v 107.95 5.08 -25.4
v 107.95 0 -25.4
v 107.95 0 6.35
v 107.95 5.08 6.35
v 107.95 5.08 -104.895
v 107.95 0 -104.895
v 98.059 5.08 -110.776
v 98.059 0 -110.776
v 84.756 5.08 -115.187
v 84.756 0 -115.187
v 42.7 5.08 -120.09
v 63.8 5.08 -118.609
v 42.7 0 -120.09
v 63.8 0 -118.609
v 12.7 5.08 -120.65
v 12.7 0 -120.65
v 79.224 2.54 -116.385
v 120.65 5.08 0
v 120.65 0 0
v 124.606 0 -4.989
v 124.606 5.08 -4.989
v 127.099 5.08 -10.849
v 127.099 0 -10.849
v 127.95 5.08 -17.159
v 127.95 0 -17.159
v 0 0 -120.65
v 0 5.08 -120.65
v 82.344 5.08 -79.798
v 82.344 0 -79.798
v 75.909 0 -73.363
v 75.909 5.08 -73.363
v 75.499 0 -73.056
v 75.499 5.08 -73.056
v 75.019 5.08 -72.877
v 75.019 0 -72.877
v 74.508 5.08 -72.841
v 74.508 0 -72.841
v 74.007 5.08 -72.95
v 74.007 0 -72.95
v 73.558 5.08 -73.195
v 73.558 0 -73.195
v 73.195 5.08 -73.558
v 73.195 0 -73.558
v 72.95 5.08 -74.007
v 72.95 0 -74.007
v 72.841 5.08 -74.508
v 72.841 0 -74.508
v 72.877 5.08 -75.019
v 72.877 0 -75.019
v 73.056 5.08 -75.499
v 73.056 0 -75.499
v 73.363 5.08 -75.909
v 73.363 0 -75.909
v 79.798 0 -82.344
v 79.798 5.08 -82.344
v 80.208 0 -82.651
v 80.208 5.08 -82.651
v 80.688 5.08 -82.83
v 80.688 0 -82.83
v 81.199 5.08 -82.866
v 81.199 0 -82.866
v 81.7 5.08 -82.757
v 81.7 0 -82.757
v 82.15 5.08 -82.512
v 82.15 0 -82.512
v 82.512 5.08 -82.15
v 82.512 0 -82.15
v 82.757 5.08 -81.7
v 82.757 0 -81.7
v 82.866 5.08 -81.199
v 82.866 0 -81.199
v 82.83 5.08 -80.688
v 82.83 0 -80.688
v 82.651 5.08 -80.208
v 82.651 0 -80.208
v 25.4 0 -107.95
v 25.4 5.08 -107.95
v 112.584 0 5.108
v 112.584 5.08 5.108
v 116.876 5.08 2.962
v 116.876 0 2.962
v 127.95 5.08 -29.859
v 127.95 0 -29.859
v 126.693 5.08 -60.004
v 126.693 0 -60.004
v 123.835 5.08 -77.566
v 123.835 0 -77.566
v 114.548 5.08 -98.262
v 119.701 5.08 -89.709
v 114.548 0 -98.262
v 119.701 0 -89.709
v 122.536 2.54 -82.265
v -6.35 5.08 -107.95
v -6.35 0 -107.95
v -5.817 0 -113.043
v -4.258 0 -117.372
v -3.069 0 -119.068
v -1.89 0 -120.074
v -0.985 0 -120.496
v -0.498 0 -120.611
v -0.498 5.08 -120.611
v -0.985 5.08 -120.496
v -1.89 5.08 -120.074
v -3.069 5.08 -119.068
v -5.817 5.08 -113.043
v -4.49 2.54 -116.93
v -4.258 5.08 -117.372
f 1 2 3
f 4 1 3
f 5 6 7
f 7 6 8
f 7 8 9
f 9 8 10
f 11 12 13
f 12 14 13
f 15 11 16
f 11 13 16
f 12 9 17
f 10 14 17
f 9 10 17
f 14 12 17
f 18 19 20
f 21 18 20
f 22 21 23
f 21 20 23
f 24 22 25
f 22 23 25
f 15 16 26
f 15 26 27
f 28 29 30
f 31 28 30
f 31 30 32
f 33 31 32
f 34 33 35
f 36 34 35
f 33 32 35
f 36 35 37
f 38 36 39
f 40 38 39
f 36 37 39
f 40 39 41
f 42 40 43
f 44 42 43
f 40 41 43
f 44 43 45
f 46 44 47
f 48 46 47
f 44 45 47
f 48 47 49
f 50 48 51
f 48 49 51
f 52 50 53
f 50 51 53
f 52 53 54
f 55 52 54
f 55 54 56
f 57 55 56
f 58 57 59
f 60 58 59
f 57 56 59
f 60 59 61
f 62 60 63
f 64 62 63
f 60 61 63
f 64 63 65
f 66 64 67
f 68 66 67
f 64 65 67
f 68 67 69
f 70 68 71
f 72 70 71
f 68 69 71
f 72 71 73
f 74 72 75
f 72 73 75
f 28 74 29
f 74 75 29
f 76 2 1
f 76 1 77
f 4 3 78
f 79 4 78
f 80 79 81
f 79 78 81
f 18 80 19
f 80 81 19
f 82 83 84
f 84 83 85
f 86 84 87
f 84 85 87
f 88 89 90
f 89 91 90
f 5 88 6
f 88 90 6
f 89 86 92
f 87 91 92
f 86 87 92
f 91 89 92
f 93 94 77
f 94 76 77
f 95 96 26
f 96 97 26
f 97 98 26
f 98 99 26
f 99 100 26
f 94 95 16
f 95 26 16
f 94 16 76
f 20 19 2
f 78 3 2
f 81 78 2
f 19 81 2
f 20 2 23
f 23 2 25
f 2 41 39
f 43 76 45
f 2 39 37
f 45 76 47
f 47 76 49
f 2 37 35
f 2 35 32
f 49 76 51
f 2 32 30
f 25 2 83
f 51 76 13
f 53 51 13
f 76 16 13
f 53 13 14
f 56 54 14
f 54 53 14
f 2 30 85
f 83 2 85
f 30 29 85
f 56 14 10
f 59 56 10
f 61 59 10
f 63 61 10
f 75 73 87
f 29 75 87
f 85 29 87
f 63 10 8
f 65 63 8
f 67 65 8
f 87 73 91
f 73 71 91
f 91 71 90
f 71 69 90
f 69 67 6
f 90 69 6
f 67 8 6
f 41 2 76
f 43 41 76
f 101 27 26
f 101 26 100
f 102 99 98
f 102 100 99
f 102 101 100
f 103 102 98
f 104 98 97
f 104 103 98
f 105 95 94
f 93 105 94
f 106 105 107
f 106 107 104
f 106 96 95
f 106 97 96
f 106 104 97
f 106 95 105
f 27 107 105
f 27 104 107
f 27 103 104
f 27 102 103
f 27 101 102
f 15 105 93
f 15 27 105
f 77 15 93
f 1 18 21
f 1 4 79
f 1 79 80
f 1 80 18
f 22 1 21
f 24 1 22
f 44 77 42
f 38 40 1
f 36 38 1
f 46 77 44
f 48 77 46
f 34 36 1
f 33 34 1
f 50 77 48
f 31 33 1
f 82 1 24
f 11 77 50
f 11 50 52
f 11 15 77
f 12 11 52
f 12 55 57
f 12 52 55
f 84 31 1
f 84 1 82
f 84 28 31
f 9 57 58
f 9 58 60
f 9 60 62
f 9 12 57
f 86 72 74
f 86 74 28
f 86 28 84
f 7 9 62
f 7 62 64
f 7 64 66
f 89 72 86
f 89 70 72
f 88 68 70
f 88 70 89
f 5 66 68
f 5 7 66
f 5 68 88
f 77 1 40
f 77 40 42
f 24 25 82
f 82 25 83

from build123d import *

# Parameters (mm, degrees)
BOSS_EXTRUDE1_DEPTH = 5.08
SKETCH2_W           = 12.7
SKETCH2_H           = 5.08
BOSS_EXTRUDE2_DEPTH = 6.35
FILLET3_SIZE        = 6.35
FILLET3_SIZE_2      = 12.7
BOSS_EXTRUDE3_START = -5.08
BOSS_EXTRUDE3_DEPTH = 5.08


with BuildPart() as part:
    # Sketch1 → Boss-Extrude1 (new body)
    with BuildSketch(Plane(origin=(0, 0, 0), x_dir=(1, 0, 0), z_dir=(0, 1, 0))):
        with BuildLine():
            Line((0, 120.65), (12.7, 120.65))
            ThreePointArc((12.7, 120.65), (89.032177029, 89.032177029), (120.65, 12.7))
            Line((120.65, 12.7), (120.65, 0))
            Line((120.65, 0), (107.95, 0))
            Line((107.95, 0), (107.95, 25.4))
            Line((107.95, 25.4), (25.4, 107.95))
            Line((25.4, 107.95), (0, 107.95))
            Line((0, 107.95), (0, 120.65))
        make_face()
        with BuildLine():
            Line((73.363460454, 75.909044866), (79.798132163, 82.343716575))
            ThreePointArc((79.798132163, 82.343716575), (82.343716575, 82.343716575), (82.343716575, 79.798132163))
            Line((82.343716575, 79.798132163), (75.909044866, 73.363460454))
            ThreePointArc((75.909044866, 73.363460454), (73.363460454, 73.363460454), (73.363460454, 75.909044866))
        make_face(mode=Mode.SUBTRACT)
    extrude(amount=BOSS_EXTRUDE1_DEPTH)

    # Sketch2 → Boss-Extrude2 (add)
    with BuildSketch(Plane.ZY):
        with Locations((-114.3, 2.54)):
            Rectangle(SKETCH2_W, SKETCH2_H)
    extrude(amount=BOSS_EXTRUDE2_DEPTH)

    # Fillet3
    # an asymmetric fillet: 12.7, 6.35 mm, written as the material it takes off along each edge
    with BuildSketch(Plane(origin=(-6.35, 36.83, -120.65), x_dir=(1, 0, 0), z_dir=(0, -1, 0))) as fillet3_piece_1:
        with BuildLine():
            Bezier((FILLET3_SIZE, 0), (0, 0), (0, FILLET3_SIZE_2), weights=[1, 0.707106781, 1])
            Line((0, FILLET3_SIZE_2), (0, 0))
            Line((0, 0), (FILLET3_SIZE, 0))
        make_face()
    extrude(amount=68.58, mode=Mode.SUBTRACT)

    # Sketch3 → Boss-Extrude3 (add)
    with BuildSketch(Plane(origin=(0, 5.08, 0), x_dir=(1, 0, 0), z_dir=(0, 1, 0)).offset(BOSS_EXTRUDE3_START)):
        with BuildLine():
            ThreePointArc((12.7, 120.65), (68.239816798, 105.266361331), (107.95, 63.5))
            Line((107.95, 63.5), (107.95, 104.894556371))
            add(Edge.make_bspline(
                [(107.95, 104.894556371), (87.95, 120.65), (12.7, 120.65)],
                knots=[0.5, 0.5, 0.5, 1, 1, 1], degree=2, weights=[1.440625, 1.440625, 1]))
        make_face()
        with BuildLine():
            Line((120.65, 12.7), (120.65, 0))
            ThreePointArc((120.65, 0), (126.049146067, 7.835495184), (127.95, 17.159256086))
            Line((127.95, 17.159256086), (127.95, 29.859256086))
            add(Edge.make_bspline(
                [(127.95, 29.859256086), (127.95, 89.139112741), (107.95, 104.894556371)],
                knots=[0, 0, 0, 0.5, 0.5, 0.5], degree=2, weights=[1, 1.440625, 1.440625]))
            Line((107.95, 104.894556371), (107.95, 63.5))
            ThreePointArc((107.95, 63.5), (117.426882891, 38.881720723), (120.65, 12.7))
        make_face()
        with BuildLine():
            Line((120.65, 0), (107.95, 0))
            Line((107.95, 0), (107.95, -6.35))
            ThreePointArc((107.95, -6.35), (114.784215424, -4.143430847), (120.65, 0))
        make_face()
    extrude(amount=BOSS_EXTRUDE3_DEPTH)


solid = part.part
